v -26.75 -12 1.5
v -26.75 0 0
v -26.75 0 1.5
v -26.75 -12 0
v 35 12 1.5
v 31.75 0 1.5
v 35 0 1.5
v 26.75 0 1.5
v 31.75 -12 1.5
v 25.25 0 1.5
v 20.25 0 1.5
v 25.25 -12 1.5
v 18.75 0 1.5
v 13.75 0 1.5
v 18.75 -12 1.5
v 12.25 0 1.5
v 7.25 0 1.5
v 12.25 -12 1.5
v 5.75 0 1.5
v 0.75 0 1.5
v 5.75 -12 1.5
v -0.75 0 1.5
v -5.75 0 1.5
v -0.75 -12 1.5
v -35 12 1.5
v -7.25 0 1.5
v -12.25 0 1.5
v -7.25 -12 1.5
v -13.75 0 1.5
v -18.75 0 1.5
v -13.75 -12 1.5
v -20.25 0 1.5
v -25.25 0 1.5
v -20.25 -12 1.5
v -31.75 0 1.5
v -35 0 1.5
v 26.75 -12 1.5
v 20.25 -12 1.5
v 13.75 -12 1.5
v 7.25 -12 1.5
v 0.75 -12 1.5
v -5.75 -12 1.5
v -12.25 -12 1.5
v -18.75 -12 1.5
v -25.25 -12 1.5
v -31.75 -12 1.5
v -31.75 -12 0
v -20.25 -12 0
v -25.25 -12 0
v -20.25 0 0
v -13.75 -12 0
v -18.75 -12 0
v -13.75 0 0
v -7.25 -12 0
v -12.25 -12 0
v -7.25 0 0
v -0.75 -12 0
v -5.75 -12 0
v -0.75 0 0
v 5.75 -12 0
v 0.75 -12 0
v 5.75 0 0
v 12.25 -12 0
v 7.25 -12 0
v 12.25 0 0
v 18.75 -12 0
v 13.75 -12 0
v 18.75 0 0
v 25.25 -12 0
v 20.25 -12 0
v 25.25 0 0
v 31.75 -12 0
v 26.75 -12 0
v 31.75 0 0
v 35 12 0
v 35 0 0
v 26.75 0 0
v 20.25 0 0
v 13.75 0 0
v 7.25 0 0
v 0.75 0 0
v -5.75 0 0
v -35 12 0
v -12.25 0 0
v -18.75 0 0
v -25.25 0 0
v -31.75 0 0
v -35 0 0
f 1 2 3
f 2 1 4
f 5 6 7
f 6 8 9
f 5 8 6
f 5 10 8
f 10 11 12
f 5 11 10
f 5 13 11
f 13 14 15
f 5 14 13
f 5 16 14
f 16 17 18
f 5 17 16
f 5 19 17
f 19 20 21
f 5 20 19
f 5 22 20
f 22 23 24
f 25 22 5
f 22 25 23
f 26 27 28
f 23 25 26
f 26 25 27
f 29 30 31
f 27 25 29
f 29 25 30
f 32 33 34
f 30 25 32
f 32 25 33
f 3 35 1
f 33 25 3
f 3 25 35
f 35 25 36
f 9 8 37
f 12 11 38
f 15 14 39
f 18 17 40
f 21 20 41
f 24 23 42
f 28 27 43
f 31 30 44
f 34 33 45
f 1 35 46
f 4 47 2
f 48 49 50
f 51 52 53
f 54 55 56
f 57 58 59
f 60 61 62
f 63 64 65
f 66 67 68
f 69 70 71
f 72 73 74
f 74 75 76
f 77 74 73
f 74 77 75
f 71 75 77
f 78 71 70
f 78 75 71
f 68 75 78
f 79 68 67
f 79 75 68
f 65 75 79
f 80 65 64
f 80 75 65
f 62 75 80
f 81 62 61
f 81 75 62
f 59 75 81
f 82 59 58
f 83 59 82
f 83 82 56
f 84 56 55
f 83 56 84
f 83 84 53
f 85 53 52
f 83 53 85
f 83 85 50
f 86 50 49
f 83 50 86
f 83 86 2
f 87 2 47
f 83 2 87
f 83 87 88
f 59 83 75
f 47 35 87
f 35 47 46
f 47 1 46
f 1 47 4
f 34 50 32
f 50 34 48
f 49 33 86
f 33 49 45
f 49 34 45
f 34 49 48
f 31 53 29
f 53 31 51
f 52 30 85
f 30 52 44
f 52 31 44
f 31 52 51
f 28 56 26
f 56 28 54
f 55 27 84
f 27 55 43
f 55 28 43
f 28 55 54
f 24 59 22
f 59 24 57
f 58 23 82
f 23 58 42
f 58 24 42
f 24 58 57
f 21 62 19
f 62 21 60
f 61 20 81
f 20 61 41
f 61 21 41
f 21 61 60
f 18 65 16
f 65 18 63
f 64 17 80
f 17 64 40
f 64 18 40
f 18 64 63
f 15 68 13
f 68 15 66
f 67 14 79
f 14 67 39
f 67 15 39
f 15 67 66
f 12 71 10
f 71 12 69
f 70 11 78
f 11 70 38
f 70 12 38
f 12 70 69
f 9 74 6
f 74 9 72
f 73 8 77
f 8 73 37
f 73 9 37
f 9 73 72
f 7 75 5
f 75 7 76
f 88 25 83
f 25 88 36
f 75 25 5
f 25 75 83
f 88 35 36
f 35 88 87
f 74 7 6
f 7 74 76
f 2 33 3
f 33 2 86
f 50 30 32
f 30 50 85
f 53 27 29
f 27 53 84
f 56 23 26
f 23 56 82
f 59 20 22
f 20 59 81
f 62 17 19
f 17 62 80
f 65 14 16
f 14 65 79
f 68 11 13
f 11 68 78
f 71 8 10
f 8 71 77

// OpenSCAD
// 10-well agarose gel comb - printed flat on the bed
// Units: mm

$fn = 64;

// ---- Parameters ----
plate_t      = 1.5;   // plate thickness (Z)
spine_len    = 70;    // spine length (X)
spine_w      = 12;    // spine width (Y)
n_teeth      = 10;    // number of teeth / wells
tooth_w      = 5.0;   // tooth width (X)
tooth_len    = 12;    // tooth length (Y), hanging in -Y
tooth_gap    = 1.5;   // gap between neighbouring teeth (X)
overlap      = 0.01;  // small overlap so teeth fuse into spine

// ---- Derived ----
row_w     = n_teeth * tooth_w + (n_teeth - 1) * tooth_gap; // total width of tooth row
total_y   = spine_w + tooth_len;                           // overall Y extent
y_min     = -total_y / 2;                                  // centre part in Y
spine_y0  = y_min + tooth_len;                             // spine starts after teeth
tooth_x0  = -row_w / 2;                                    // first tooth left edge
pitch     = tooth_w + tooth_gap;                           // tooth pitch

// ---- Model ----
union() {
    // Spine (back bar)
    translate([-spine_len / 2, spine_y0, 0])
        cube([spine_len, spine_w, plate_t]);

    // Teeth
    for (i = [0 : n_teeth - 1])
        translate([tooth_x0 + i * pitch, y_min, 0])
            cube([tooth_w, tooth_len + overlap, plate_t]);
}
